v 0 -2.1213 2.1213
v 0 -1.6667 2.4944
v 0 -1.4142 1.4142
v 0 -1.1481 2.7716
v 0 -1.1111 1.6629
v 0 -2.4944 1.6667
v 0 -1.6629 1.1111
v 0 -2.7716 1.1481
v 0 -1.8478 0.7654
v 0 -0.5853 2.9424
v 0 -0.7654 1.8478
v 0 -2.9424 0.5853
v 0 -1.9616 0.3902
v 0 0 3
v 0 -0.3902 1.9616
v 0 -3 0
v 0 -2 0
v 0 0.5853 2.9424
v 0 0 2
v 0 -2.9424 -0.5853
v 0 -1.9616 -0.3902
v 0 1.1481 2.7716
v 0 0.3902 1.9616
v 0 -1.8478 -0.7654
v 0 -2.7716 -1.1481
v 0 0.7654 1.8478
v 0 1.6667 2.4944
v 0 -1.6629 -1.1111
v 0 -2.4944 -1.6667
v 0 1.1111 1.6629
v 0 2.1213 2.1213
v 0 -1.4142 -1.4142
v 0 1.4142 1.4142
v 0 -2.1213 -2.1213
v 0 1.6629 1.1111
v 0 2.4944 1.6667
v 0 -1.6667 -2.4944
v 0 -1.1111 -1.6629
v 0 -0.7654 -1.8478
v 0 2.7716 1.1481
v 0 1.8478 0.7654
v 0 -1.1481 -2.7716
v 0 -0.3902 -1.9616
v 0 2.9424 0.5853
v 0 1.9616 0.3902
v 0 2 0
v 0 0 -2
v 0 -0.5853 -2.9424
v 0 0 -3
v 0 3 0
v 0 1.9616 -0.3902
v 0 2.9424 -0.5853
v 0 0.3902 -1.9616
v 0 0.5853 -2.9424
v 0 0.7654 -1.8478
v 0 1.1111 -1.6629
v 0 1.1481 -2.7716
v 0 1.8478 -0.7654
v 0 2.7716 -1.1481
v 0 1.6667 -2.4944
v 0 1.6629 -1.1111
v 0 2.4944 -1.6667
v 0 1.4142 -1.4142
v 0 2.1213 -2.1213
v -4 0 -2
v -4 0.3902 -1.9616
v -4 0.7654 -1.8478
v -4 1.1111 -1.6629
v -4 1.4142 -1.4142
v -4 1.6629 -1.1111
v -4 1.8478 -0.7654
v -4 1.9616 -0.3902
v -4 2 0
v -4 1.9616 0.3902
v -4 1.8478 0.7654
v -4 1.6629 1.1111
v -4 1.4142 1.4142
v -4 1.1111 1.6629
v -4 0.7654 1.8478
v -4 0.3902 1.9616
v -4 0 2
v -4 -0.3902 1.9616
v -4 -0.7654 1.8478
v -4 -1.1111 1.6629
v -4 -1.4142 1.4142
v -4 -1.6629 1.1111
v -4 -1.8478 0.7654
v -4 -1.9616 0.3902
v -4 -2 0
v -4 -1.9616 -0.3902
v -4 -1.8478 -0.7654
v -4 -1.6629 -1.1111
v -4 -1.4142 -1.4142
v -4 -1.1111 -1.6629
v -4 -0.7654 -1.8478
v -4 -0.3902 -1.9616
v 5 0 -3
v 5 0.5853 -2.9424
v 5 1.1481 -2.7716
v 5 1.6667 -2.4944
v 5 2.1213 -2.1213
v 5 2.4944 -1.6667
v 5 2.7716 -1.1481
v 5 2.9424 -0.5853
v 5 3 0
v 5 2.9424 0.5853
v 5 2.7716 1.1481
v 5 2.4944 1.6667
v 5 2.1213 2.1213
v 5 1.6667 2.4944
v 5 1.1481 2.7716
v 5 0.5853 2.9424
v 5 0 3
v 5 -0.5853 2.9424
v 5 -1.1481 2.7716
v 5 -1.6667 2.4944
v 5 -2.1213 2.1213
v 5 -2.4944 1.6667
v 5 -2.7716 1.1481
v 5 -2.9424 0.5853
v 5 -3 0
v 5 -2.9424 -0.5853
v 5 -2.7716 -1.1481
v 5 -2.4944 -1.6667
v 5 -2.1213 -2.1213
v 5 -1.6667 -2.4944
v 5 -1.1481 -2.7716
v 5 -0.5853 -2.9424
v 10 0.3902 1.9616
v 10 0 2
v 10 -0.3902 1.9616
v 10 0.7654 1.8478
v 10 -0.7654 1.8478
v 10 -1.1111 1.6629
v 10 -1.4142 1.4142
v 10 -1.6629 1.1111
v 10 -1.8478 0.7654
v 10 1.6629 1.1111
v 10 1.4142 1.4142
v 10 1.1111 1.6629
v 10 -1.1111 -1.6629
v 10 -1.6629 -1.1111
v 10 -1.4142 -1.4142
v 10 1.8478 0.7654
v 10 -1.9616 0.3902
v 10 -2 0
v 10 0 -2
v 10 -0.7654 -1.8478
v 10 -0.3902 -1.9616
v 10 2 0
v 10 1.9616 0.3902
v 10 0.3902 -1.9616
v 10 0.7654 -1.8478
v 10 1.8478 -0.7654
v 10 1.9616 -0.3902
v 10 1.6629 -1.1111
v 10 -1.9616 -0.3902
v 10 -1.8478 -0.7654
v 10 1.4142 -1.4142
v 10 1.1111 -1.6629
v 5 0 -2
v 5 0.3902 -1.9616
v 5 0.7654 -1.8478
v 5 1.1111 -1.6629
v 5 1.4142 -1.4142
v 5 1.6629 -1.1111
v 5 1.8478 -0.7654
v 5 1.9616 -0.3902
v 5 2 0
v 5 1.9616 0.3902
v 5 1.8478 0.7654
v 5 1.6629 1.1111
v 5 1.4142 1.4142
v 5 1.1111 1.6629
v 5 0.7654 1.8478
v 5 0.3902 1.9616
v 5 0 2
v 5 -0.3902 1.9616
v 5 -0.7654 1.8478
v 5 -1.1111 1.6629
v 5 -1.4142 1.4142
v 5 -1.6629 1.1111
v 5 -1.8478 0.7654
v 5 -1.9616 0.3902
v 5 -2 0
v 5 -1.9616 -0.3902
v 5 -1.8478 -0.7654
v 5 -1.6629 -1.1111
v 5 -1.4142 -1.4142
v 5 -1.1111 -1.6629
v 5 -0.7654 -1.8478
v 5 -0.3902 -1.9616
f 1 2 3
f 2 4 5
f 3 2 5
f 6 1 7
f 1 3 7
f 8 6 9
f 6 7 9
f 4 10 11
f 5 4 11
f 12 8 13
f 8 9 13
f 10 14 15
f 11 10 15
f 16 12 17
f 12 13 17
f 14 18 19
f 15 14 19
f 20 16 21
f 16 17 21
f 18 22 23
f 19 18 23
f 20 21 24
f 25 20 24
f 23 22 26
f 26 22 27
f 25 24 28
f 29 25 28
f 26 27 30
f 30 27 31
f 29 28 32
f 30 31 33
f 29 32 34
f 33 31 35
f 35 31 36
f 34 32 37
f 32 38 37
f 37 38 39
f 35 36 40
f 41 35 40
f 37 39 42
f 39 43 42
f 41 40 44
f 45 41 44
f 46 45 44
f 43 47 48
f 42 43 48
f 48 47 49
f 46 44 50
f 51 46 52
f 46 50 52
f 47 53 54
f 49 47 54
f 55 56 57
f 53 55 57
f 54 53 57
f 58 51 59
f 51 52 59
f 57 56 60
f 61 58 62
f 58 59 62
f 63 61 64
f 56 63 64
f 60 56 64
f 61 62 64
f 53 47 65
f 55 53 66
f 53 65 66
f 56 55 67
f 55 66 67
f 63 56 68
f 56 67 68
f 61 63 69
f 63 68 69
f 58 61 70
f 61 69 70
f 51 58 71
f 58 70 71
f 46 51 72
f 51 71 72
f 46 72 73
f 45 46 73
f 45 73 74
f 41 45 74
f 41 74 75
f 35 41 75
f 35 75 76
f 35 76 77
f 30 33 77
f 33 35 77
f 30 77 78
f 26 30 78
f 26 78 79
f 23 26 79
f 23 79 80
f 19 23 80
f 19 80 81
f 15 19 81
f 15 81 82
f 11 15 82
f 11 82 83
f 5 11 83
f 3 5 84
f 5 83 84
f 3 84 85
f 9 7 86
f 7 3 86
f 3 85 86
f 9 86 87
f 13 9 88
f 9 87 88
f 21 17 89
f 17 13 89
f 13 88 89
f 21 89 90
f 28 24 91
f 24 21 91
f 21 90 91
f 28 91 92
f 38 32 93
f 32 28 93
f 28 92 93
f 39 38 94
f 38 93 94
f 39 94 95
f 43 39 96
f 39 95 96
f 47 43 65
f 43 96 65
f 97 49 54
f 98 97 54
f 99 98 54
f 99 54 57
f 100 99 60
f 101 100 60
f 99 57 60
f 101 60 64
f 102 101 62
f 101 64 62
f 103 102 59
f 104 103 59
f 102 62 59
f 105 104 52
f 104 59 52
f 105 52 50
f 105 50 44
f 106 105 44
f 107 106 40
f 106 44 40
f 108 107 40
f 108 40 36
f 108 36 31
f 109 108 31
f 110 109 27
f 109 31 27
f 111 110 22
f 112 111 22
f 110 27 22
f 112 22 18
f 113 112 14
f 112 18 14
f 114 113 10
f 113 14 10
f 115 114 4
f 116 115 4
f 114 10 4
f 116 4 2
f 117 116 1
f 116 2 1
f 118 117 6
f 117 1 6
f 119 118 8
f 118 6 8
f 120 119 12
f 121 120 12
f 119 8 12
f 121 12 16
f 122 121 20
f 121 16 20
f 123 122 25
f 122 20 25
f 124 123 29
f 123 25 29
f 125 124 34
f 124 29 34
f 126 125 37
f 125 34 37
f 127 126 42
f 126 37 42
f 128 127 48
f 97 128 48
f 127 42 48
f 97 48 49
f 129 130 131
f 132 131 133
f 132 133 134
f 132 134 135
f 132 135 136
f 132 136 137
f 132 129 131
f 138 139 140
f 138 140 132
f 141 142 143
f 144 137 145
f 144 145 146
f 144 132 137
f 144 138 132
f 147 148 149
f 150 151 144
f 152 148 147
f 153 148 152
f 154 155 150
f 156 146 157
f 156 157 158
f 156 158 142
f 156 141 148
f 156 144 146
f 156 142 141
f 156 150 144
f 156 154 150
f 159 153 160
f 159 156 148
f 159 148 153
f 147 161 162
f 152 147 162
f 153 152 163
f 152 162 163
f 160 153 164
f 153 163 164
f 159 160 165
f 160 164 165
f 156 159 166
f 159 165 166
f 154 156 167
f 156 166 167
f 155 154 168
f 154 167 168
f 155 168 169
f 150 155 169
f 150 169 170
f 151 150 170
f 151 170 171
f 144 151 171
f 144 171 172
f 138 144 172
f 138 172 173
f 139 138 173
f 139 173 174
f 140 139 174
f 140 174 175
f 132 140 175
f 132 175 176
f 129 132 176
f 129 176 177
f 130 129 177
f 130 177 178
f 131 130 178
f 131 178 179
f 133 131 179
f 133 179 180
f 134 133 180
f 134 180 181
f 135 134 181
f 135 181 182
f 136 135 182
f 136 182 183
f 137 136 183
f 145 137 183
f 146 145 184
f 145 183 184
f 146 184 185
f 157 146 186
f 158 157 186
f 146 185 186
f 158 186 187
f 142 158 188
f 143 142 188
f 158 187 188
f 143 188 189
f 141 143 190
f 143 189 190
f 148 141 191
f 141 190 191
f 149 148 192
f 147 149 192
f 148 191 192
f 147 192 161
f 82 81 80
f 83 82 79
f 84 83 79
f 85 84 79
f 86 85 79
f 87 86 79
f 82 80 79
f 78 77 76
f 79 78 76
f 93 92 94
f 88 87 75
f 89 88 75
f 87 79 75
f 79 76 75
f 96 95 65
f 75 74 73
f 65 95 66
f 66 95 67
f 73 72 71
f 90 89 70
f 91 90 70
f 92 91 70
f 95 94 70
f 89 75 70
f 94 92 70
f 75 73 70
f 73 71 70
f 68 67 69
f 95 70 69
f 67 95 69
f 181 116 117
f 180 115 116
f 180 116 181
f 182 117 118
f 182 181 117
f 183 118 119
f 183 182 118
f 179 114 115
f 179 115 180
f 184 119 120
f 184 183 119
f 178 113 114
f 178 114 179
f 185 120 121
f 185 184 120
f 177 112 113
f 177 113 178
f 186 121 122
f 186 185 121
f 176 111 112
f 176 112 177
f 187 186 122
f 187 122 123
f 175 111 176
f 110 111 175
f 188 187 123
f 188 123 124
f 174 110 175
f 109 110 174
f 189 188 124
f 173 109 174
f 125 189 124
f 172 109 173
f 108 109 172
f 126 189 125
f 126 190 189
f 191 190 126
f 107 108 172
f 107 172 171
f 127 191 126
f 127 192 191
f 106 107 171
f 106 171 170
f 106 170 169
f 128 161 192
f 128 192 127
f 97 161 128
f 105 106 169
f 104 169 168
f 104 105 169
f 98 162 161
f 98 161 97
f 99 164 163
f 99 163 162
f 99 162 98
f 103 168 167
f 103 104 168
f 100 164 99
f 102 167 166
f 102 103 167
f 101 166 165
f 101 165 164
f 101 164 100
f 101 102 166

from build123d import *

# Parameters (mm, degrees)
SKETCH1_R                = 3
BOSS_EXTRUDE1_DEPTH      = 5
BOSS_EXTRUDE2_DEPTH      = 5
BOSS_EXTRUDE2_DEPTH_BACK = 9
SKETCH2_R                = 2


with BuildPart() as part:
    # Sketch1 → Boss-Extrude1 (new body)
    with BuildSketch(Plane(origin=(0, 0, 0), x_dir=(0, 0, -1), z_dir=(1, 0, 0))):
        Circle(SKETCH1_R)
    extrude(amount=BOSS_EXTRUDE1_DEPTH)

    # Sketch2 → Boss-Extrude2 (add, two sides: drawn at the far end of the back side and taken through both)
    with BuildSketch(Plane(origin=(5, 0, 0), x_dir=(0, 0, -1), z_dir=(1, 0, 0)).offset(-BOSS_EXTRUDE2_DEPTH_BACK)):
        Circle(SKETCH2_R)
    extrude(amount=BOSS_EXTRUDE2_DEPTH + BOSS_EXTRUDE2_DEPTH_BACK)


solid = part.part
